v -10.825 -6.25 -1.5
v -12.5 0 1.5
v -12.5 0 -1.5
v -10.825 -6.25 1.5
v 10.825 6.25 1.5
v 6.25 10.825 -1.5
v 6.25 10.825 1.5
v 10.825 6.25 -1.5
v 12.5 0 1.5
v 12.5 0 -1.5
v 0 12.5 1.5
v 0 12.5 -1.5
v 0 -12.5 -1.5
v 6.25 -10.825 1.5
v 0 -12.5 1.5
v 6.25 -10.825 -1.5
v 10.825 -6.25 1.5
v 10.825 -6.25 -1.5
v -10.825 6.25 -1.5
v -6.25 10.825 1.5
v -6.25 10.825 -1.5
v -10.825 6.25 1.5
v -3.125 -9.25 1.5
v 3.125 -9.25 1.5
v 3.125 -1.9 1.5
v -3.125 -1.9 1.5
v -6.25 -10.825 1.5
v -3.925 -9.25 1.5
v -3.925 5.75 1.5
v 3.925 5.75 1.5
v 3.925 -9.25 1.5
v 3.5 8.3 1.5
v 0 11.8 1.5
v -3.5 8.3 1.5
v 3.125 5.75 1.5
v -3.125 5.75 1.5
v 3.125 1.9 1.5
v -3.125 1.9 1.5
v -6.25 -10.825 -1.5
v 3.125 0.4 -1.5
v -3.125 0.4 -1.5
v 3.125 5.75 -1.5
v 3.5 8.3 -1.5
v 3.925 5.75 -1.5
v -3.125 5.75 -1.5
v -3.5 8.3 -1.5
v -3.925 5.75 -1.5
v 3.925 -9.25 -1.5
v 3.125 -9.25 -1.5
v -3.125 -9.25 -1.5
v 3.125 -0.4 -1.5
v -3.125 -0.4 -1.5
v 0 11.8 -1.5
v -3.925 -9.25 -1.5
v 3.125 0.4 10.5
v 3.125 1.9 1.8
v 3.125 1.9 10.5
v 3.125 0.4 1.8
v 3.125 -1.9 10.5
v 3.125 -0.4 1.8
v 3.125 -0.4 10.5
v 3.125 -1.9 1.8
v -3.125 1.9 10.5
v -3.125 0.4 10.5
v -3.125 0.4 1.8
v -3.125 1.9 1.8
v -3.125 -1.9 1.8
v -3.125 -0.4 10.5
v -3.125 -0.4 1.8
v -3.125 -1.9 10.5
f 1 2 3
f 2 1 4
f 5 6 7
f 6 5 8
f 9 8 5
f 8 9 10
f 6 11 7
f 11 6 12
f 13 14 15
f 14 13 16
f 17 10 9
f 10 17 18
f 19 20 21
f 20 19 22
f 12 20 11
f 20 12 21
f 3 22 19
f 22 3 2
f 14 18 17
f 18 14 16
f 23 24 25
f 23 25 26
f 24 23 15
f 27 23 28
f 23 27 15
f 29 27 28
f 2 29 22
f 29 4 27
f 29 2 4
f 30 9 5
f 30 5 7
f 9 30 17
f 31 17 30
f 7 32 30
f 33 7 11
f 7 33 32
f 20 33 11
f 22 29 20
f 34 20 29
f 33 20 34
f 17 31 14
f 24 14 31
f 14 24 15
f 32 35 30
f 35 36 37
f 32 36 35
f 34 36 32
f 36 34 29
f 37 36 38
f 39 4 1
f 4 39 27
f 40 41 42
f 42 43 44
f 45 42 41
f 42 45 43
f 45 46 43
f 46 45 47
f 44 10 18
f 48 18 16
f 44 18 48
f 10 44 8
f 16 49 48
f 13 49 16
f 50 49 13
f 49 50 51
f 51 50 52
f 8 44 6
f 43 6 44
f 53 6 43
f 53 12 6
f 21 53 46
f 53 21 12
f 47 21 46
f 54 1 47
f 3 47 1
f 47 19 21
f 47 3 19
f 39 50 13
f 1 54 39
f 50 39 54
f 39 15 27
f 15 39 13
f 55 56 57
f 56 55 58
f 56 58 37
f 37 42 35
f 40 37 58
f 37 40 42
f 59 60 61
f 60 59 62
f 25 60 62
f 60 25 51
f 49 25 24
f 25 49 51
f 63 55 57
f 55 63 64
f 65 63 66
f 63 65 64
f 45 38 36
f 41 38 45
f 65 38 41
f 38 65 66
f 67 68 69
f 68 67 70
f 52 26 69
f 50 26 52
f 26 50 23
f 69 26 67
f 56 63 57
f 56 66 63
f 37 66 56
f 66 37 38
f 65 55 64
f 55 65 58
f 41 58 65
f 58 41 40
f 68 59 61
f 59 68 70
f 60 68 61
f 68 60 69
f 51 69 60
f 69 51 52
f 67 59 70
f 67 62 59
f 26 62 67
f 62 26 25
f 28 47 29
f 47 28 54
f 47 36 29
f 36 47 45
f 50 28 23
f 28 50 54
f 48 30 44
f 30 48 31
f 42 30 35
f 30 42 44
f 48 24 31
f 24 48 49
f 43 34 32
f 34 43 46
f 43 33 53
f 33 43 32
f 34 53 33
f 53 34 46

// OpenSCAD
$fn=12;

// unit is mm

diameter = 25;
thickness = 3;
slit_width = 0.8;
arrow_base = 7;
support_height = 9;

ab_2 = arrow_base / 2;
ab_4 = arrow_base / 4;
thickness_2 = thickness / 2;
thickness_4 = thickness / 4;
thickness12 = 1.2 * thickness;
diameter_2 = diameter / 2;
diameter_4 = diameter / 4;
diameter_8 = diameter / 8;
sw_2 = slit_width / 2;
sh_2 = support_height / 2;


difference() {

  union() {

    // base

    cylinder(d=diameter, h=thickness, center=true);

    // support

    translate([ 0, thickness_4 + sw_2, thickness_2 + sh_2 ])
      cube([ diameter_4, thickness_2, support_height ], center=true);
    translate([ 0, -thickness_4 - sw_2, thickness_2 + sh_2 ])
      cube([ diameter_4, thickness_2, support_height ], center=true);
  }

  union() {

    // H

    translate([ 0, 0, 0 ])
      cube([ diameter_4, slit_width, thickness12 ], center=true);
    translate([ -diameter_8 - sw_2, -ab_4, 0 ])
      cube([ slit_width, 0.6 * diameter, thickness12 ], center=true);
    translate([ diameter_8 + sw_2, -ab_4, 0 ])
      cube([ slit_width, 0.6 * diameter, thickness12 ], center=true);

    // arrow

    translate([ 0, diameter_2 - 1.2 * ab_2, -0.5 * thickness12 ])
      linear_extrude(thickness12)
        polygon([
          [ -ab_2, 0 ], [ 0, ab_2 ], [ ab_2, 0 ] ]);
  }
}
